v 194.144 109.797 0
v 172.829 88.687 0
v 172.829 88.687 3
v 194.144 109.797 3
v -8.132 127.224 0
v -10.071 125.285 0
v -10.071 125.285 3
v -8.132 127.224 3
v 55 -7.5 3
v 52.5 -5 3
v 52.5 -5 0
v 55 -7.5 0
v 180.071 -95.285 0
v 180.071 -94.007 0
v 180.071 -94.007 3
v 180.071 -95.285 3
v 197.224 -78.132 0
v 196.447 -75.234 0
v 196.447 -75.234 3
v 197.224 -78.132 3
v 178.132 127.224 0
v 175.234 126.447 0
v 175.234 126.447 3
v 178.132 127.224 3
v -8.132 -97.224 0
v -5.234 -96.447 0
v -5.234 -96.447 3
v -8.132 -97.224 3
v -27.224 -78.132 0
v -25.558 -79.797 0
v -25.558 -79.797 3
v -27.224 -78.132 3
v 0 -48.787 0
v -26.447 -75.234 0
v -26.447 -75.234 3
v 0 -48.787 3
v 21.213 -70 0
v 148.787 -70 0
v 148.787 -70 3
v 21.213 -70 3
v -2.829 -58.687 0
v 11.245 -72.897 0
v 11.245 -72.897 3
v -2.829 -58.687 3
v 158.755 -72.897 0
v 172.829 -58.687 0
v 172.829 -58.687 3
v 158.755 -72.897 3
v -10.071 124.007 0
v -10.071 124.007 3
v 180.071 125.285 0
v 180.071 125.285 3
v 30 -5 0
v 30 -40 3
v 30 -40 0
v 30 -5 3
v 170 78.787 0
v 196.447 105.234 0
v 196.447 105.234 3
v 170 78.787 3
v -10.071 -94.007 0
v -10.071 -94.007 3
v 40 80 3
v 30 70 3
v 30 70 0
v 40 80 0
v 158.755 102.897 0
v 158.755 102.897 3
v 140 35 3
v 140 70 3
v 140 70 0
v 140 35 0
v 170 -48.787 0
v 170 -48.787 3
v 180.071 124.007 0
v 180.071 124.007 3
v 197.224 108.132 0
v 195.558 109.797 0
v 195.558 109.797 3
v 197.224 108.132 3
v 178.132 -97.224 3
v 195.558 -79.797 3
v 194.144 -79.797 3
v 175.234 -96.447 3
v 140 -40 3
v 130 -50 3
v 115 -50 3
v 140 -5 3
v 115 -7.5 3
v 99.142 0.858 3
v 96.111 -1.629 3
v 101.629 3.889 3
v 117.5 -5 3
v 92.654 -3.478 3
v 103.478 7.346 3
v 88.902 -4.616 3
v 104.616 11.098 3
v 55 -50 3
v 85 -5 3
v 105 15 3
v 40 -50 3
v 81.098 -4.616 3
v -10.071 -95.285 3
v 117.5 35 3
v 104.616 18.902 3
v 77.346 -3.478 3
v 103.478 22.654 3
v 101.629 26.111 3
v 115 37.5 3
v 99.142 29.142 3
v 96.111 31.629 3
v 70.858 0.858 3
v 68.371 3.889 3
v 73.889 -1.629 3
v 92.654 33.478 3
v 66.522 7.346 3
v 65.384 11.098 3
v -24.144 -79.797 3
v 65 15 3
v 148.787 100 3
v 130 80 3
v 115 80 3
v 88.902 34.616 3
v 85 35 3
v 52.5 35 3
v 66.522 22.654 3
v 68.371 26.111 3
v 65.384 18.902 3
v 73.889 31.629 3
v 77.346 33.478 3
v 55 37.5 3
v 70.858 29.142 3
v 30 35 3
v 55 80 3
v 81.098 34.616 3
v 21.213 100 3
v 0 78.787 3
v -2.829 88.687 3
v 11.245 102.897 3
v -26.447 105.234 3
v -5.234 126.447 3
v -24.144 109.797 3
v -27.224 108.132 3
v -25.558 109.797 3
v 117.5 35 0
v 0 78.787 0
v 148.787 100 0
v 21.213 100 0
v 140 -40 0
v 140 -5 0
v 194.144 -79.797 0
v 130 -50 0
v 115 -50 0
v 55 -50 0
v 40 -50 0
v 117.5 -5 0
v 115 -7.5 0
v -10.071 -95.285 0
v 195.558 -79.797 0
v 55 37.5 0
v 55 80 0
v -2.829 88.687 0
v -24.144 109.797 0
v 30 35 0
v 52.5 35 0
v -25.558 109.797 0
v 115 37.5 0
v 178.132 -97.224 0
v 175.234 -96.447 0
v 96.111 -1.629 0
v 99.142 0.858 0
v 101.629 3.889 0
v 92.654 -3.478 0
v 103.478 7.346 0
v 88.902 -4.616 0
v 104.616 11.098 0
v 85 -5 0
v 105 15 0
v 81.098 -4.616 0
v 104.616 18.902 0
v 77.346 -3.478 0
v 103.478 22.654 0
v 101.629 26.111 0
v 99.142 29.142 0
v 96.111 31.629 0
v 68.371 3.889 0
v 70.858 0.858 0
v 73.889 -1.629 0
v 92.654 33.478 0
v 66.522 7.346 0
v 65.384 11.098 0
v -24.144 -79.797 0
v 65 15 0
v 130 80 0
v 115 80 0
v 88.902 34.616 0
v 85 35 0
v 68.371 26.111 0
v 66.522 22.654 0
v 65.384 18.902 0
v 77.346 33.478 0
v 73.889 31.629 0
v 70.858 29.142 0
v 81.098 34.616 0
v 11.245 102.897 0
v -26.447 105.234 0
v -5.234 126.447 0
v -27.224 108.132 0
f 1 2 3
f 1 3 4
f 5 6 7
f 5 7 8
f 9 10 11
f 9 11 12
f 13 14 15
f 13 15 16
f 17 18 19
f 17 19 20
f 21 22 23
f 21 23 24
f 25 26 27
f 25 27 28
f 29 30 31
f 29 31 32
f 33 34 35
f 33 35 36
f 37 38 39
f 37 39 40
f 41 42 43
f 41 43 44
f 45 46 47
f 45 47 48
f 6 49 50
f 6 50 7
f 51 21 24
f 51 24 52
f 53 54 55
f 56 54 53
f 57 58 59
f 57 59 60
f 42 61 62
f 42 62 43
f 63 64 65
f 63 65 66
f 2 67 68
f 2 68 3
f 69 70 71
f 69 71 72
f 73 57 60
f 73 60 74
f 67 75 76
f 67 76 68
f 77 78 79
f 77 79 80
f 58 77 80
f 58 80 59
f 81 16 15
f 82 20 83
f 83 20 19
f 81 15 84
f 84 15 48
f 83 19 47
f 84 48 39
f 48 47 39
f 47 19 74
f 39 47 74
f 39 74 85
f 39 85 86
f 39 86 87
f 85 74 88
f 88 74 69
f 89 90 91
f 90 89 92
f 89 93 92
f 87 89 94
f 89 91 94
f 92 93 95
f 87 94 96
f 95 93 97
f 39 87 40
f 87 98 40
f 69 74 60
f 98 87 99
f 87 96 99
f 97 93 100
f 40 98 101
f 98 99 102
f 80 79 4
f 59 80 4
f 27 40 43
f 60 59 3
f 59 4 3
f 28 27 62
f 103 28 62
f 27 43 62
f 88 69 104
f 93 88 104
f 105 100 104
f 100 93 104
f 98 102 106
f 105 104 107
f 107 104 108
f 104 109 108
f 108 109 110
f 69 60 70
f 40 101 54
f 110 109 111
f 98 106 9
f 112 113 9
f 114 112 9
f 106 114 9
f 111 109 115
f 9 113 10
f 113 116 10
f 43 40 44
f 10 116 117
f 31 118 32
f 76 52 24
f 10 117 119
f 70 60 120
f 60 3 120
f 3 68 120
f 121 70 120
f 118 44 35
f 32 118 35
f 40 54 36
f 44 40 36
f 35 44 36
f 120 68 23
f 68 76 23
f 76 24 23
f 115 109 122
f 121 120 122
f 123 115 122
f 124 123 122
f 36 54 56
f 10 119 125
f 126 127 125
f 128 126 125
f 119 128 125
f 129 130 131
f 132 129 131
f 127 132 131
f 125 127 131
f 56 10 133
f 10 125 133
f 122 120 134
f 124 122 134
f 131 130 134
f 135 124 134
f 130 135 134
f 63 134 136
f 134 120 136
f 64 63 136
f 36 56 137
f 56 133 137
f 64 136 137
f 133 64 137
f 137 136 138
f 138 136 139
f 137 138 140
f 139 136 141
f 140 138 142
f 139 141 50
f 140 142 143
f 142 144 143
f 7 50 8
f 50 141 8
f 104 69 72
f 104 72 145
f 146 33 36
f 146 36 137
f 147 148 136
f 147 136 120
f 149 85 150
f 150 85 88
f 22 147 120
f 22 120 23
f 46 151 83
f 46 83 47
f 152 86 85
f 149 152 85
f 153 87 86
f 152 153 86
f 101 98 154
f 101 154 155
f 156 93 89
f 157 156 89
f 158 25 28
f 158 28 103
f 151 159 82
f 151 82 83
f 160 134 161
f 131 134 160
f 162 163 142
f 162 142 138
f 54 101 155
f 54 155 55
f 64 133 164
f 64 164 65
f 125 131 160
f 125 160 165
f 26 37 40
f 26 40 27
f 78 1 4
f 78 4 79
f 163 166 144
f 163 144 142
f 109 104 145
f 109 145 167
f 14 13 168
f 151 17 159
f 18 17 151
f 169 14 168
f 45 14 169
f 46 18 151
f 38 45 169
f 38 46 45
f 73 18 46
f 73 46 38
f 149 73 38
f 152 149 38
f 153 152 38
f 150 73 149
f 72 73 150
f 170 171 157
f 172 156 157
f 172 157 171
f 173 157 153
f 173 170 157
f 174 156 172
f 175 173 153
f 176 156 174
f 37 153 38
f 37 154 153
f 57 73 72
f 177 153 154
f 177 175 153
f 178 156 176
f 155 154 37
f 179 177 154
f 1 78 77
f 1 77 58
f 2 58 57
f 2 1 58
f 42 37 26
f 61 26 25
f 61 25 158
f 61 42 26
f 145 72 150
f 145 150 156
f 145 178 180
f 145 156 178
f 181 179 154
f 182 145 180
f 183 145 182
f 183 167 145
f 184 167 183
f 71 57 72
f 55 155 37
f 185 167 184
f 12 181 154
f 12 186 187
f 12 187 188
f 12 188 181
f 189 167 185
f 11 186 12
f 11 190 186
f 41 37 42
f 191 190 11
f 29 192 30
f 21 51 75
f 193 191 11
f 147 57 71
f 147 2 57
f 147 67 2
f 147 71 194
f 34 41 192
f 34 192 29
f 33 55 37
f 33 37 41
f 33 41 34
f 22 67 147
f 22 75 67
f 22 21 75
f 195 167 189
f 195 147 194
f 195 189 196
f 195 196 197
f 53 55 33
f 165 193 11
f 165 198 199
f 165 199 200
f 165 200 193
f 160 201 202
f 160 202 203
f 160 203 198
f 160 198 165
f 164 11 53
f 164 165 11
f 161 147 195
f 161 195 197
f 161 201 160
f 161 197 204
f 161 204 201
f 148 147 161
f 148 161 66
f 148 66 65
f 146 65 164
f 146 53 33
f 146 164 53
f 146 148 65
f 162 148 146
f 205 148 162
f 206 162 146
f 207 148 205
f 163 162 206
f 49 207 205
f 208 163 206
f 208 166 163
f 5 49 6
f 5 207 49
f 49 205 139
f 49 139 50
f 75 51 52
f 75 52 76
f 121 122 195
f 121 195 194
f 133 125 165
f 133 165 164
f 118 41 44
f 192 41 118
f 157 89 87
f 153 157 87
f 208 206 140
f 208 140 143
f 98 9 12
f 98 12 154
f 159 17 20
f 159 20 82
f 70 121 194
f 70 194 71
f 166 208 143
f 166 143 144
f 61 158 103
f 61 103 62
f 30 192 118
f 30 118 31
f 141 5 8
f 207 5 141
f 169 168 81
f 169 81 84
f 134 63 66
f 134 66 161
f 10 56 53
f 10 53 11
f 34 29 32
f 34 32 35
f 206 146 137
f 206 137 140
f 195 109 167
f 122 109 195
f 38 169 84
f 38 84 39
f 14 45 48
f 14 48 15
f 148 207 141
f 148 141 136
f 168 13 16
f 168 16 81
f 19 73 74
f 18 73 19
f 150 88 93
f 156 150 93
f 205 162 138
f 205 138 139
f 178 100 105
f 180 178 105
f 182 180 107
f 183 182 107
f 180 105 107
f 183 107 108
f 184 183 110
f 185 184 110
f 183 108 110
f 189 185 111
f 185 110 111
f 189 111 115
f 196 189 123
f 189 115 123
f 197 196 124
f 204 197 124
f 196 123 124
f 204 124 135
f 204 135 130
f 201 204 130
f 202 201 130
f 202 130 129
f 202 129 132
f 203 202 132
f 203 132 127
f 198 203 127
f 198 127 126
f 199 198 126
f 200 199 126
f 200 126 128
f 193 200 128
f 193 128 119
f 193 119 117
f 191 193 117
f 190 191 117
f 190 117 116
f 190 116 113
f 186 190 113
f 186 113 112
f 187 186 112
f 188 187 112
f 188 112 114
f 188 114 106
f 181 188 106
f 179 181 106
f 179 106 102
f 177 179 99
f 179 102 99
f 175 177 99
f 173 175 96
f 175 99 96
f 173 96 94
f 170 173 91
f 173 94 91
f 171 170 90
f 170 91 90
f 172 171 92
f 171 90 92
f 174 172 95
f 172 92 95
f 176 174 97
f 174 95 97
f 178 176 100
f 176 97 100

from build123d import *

# Parameters (mm, degrees)
BOSS_EXTRUDE1_DEPTH = 3
SKETCH2_R           = 20
CUT_EXTRUDE1_DEPTH  = 10


with BuildPart() as part:
    # Sketch1 → Boss-Extrude1 (new body)
    with BuildSketch(Plane.XY):
        Polygon((158.754970941, -72.897106565), (180.070576123, -94.00741153), (180.070576123, -95.284756679), (178.131724855, -97.223607947), (175.233947376, -96.447150811), (148.786793436, -69.999996871), (21.213203436, -69.999996871), (-5.233950505, -96.447150811), (-8.131727984, -97.223607947), (-10.070579252, -95.284756679), (-10.070579252, -94.00741153), (11.24502593, -72.897106565), (-2.828675487, -58.686536734), (-24.144280669, -79.796841699), (-25.558494231, -79.796841699), (-27.223611076, -78.131724855), (-26.44715394, -75.233947376), (0, -48.786793435), (0, 78.786796565), (-26.44715394, 105.233950505), (-27.223611076, 108.131727984), (-25.558494231, 109.796844828), (-24.144280669, 109.796844828), (-2.828675487, 88.686539863), (11.24502593, 102.897109694), (-10.070579252, 124.007414659), (-10.070579252, 125.284759808), (-8.131727984, 127.223611076), (-5.233950505, 126.447153941), (21.213203436, 100), (148.786793436, 100), (175.233947376, 126.447153941), (178.131724855, 127.223611076), (180.070576123, 125.284759808), (180.070576123, 124.007414659), (158.754970941, 102.897109694), (172.828672358, 88.686539863), (194.14427754, 109.796844828), (195.558491102, 109.796844828), (197.223607947, 108.131727984), (196.447150812, 105.233950505), (169.999996871, 78.786796565), (169.999996871, -48.786793435), (196.447150812, -75.233947376), (197.223607947, -78.131724855), (195.558491102, -79.796841699), (194.14427754, -79.796841699), (172.828672358, -58.686536734), align=None)
    extrude(amount=BOSS_EXTRUDE1_DEPTH)

    # Sketch2 → Cut-Extrude1 (cut)
    with BuildSketch(Plane.XY.offset(3)):
        with Locations((84.999998436, 15.000001565)):
            Circle(SKETCH2_R)
        Polygon((30, 70), (40, 80), (54.999998436, 80), (54.999998436, 37.500001565), (52.499998436, 35.000001565), (30, 35.000001565), align=None)
        Polygon((30, -4.999998435), (52.499998436, -4.999998435), (54.999998436, -7.499998435), (54.999998436, -49.999996871), (40, -49.999996871), (30, -39.999996871), align=None)
        Polygon((139.999996871, -39.999996871), (139.999996871, -4.999998435), (117.499998436, -4.999998435), (114.999998436, -7.499998435), (114.999998436, -49.999996871), (129.999996871, -49.999996871), align=None)
        Polygon((139.999996871, 35.000001565), (117.499998436, 35.000001565), (114.999998436, 37.500001565), (114.999998436, 80), (129.999996871, 80), (139.999996871, 70), align=None)
    extrude(amount=-CUT_EXTRUDE1_DEPTH, mode=Mode.SUBTRACT)


solid = part.part
